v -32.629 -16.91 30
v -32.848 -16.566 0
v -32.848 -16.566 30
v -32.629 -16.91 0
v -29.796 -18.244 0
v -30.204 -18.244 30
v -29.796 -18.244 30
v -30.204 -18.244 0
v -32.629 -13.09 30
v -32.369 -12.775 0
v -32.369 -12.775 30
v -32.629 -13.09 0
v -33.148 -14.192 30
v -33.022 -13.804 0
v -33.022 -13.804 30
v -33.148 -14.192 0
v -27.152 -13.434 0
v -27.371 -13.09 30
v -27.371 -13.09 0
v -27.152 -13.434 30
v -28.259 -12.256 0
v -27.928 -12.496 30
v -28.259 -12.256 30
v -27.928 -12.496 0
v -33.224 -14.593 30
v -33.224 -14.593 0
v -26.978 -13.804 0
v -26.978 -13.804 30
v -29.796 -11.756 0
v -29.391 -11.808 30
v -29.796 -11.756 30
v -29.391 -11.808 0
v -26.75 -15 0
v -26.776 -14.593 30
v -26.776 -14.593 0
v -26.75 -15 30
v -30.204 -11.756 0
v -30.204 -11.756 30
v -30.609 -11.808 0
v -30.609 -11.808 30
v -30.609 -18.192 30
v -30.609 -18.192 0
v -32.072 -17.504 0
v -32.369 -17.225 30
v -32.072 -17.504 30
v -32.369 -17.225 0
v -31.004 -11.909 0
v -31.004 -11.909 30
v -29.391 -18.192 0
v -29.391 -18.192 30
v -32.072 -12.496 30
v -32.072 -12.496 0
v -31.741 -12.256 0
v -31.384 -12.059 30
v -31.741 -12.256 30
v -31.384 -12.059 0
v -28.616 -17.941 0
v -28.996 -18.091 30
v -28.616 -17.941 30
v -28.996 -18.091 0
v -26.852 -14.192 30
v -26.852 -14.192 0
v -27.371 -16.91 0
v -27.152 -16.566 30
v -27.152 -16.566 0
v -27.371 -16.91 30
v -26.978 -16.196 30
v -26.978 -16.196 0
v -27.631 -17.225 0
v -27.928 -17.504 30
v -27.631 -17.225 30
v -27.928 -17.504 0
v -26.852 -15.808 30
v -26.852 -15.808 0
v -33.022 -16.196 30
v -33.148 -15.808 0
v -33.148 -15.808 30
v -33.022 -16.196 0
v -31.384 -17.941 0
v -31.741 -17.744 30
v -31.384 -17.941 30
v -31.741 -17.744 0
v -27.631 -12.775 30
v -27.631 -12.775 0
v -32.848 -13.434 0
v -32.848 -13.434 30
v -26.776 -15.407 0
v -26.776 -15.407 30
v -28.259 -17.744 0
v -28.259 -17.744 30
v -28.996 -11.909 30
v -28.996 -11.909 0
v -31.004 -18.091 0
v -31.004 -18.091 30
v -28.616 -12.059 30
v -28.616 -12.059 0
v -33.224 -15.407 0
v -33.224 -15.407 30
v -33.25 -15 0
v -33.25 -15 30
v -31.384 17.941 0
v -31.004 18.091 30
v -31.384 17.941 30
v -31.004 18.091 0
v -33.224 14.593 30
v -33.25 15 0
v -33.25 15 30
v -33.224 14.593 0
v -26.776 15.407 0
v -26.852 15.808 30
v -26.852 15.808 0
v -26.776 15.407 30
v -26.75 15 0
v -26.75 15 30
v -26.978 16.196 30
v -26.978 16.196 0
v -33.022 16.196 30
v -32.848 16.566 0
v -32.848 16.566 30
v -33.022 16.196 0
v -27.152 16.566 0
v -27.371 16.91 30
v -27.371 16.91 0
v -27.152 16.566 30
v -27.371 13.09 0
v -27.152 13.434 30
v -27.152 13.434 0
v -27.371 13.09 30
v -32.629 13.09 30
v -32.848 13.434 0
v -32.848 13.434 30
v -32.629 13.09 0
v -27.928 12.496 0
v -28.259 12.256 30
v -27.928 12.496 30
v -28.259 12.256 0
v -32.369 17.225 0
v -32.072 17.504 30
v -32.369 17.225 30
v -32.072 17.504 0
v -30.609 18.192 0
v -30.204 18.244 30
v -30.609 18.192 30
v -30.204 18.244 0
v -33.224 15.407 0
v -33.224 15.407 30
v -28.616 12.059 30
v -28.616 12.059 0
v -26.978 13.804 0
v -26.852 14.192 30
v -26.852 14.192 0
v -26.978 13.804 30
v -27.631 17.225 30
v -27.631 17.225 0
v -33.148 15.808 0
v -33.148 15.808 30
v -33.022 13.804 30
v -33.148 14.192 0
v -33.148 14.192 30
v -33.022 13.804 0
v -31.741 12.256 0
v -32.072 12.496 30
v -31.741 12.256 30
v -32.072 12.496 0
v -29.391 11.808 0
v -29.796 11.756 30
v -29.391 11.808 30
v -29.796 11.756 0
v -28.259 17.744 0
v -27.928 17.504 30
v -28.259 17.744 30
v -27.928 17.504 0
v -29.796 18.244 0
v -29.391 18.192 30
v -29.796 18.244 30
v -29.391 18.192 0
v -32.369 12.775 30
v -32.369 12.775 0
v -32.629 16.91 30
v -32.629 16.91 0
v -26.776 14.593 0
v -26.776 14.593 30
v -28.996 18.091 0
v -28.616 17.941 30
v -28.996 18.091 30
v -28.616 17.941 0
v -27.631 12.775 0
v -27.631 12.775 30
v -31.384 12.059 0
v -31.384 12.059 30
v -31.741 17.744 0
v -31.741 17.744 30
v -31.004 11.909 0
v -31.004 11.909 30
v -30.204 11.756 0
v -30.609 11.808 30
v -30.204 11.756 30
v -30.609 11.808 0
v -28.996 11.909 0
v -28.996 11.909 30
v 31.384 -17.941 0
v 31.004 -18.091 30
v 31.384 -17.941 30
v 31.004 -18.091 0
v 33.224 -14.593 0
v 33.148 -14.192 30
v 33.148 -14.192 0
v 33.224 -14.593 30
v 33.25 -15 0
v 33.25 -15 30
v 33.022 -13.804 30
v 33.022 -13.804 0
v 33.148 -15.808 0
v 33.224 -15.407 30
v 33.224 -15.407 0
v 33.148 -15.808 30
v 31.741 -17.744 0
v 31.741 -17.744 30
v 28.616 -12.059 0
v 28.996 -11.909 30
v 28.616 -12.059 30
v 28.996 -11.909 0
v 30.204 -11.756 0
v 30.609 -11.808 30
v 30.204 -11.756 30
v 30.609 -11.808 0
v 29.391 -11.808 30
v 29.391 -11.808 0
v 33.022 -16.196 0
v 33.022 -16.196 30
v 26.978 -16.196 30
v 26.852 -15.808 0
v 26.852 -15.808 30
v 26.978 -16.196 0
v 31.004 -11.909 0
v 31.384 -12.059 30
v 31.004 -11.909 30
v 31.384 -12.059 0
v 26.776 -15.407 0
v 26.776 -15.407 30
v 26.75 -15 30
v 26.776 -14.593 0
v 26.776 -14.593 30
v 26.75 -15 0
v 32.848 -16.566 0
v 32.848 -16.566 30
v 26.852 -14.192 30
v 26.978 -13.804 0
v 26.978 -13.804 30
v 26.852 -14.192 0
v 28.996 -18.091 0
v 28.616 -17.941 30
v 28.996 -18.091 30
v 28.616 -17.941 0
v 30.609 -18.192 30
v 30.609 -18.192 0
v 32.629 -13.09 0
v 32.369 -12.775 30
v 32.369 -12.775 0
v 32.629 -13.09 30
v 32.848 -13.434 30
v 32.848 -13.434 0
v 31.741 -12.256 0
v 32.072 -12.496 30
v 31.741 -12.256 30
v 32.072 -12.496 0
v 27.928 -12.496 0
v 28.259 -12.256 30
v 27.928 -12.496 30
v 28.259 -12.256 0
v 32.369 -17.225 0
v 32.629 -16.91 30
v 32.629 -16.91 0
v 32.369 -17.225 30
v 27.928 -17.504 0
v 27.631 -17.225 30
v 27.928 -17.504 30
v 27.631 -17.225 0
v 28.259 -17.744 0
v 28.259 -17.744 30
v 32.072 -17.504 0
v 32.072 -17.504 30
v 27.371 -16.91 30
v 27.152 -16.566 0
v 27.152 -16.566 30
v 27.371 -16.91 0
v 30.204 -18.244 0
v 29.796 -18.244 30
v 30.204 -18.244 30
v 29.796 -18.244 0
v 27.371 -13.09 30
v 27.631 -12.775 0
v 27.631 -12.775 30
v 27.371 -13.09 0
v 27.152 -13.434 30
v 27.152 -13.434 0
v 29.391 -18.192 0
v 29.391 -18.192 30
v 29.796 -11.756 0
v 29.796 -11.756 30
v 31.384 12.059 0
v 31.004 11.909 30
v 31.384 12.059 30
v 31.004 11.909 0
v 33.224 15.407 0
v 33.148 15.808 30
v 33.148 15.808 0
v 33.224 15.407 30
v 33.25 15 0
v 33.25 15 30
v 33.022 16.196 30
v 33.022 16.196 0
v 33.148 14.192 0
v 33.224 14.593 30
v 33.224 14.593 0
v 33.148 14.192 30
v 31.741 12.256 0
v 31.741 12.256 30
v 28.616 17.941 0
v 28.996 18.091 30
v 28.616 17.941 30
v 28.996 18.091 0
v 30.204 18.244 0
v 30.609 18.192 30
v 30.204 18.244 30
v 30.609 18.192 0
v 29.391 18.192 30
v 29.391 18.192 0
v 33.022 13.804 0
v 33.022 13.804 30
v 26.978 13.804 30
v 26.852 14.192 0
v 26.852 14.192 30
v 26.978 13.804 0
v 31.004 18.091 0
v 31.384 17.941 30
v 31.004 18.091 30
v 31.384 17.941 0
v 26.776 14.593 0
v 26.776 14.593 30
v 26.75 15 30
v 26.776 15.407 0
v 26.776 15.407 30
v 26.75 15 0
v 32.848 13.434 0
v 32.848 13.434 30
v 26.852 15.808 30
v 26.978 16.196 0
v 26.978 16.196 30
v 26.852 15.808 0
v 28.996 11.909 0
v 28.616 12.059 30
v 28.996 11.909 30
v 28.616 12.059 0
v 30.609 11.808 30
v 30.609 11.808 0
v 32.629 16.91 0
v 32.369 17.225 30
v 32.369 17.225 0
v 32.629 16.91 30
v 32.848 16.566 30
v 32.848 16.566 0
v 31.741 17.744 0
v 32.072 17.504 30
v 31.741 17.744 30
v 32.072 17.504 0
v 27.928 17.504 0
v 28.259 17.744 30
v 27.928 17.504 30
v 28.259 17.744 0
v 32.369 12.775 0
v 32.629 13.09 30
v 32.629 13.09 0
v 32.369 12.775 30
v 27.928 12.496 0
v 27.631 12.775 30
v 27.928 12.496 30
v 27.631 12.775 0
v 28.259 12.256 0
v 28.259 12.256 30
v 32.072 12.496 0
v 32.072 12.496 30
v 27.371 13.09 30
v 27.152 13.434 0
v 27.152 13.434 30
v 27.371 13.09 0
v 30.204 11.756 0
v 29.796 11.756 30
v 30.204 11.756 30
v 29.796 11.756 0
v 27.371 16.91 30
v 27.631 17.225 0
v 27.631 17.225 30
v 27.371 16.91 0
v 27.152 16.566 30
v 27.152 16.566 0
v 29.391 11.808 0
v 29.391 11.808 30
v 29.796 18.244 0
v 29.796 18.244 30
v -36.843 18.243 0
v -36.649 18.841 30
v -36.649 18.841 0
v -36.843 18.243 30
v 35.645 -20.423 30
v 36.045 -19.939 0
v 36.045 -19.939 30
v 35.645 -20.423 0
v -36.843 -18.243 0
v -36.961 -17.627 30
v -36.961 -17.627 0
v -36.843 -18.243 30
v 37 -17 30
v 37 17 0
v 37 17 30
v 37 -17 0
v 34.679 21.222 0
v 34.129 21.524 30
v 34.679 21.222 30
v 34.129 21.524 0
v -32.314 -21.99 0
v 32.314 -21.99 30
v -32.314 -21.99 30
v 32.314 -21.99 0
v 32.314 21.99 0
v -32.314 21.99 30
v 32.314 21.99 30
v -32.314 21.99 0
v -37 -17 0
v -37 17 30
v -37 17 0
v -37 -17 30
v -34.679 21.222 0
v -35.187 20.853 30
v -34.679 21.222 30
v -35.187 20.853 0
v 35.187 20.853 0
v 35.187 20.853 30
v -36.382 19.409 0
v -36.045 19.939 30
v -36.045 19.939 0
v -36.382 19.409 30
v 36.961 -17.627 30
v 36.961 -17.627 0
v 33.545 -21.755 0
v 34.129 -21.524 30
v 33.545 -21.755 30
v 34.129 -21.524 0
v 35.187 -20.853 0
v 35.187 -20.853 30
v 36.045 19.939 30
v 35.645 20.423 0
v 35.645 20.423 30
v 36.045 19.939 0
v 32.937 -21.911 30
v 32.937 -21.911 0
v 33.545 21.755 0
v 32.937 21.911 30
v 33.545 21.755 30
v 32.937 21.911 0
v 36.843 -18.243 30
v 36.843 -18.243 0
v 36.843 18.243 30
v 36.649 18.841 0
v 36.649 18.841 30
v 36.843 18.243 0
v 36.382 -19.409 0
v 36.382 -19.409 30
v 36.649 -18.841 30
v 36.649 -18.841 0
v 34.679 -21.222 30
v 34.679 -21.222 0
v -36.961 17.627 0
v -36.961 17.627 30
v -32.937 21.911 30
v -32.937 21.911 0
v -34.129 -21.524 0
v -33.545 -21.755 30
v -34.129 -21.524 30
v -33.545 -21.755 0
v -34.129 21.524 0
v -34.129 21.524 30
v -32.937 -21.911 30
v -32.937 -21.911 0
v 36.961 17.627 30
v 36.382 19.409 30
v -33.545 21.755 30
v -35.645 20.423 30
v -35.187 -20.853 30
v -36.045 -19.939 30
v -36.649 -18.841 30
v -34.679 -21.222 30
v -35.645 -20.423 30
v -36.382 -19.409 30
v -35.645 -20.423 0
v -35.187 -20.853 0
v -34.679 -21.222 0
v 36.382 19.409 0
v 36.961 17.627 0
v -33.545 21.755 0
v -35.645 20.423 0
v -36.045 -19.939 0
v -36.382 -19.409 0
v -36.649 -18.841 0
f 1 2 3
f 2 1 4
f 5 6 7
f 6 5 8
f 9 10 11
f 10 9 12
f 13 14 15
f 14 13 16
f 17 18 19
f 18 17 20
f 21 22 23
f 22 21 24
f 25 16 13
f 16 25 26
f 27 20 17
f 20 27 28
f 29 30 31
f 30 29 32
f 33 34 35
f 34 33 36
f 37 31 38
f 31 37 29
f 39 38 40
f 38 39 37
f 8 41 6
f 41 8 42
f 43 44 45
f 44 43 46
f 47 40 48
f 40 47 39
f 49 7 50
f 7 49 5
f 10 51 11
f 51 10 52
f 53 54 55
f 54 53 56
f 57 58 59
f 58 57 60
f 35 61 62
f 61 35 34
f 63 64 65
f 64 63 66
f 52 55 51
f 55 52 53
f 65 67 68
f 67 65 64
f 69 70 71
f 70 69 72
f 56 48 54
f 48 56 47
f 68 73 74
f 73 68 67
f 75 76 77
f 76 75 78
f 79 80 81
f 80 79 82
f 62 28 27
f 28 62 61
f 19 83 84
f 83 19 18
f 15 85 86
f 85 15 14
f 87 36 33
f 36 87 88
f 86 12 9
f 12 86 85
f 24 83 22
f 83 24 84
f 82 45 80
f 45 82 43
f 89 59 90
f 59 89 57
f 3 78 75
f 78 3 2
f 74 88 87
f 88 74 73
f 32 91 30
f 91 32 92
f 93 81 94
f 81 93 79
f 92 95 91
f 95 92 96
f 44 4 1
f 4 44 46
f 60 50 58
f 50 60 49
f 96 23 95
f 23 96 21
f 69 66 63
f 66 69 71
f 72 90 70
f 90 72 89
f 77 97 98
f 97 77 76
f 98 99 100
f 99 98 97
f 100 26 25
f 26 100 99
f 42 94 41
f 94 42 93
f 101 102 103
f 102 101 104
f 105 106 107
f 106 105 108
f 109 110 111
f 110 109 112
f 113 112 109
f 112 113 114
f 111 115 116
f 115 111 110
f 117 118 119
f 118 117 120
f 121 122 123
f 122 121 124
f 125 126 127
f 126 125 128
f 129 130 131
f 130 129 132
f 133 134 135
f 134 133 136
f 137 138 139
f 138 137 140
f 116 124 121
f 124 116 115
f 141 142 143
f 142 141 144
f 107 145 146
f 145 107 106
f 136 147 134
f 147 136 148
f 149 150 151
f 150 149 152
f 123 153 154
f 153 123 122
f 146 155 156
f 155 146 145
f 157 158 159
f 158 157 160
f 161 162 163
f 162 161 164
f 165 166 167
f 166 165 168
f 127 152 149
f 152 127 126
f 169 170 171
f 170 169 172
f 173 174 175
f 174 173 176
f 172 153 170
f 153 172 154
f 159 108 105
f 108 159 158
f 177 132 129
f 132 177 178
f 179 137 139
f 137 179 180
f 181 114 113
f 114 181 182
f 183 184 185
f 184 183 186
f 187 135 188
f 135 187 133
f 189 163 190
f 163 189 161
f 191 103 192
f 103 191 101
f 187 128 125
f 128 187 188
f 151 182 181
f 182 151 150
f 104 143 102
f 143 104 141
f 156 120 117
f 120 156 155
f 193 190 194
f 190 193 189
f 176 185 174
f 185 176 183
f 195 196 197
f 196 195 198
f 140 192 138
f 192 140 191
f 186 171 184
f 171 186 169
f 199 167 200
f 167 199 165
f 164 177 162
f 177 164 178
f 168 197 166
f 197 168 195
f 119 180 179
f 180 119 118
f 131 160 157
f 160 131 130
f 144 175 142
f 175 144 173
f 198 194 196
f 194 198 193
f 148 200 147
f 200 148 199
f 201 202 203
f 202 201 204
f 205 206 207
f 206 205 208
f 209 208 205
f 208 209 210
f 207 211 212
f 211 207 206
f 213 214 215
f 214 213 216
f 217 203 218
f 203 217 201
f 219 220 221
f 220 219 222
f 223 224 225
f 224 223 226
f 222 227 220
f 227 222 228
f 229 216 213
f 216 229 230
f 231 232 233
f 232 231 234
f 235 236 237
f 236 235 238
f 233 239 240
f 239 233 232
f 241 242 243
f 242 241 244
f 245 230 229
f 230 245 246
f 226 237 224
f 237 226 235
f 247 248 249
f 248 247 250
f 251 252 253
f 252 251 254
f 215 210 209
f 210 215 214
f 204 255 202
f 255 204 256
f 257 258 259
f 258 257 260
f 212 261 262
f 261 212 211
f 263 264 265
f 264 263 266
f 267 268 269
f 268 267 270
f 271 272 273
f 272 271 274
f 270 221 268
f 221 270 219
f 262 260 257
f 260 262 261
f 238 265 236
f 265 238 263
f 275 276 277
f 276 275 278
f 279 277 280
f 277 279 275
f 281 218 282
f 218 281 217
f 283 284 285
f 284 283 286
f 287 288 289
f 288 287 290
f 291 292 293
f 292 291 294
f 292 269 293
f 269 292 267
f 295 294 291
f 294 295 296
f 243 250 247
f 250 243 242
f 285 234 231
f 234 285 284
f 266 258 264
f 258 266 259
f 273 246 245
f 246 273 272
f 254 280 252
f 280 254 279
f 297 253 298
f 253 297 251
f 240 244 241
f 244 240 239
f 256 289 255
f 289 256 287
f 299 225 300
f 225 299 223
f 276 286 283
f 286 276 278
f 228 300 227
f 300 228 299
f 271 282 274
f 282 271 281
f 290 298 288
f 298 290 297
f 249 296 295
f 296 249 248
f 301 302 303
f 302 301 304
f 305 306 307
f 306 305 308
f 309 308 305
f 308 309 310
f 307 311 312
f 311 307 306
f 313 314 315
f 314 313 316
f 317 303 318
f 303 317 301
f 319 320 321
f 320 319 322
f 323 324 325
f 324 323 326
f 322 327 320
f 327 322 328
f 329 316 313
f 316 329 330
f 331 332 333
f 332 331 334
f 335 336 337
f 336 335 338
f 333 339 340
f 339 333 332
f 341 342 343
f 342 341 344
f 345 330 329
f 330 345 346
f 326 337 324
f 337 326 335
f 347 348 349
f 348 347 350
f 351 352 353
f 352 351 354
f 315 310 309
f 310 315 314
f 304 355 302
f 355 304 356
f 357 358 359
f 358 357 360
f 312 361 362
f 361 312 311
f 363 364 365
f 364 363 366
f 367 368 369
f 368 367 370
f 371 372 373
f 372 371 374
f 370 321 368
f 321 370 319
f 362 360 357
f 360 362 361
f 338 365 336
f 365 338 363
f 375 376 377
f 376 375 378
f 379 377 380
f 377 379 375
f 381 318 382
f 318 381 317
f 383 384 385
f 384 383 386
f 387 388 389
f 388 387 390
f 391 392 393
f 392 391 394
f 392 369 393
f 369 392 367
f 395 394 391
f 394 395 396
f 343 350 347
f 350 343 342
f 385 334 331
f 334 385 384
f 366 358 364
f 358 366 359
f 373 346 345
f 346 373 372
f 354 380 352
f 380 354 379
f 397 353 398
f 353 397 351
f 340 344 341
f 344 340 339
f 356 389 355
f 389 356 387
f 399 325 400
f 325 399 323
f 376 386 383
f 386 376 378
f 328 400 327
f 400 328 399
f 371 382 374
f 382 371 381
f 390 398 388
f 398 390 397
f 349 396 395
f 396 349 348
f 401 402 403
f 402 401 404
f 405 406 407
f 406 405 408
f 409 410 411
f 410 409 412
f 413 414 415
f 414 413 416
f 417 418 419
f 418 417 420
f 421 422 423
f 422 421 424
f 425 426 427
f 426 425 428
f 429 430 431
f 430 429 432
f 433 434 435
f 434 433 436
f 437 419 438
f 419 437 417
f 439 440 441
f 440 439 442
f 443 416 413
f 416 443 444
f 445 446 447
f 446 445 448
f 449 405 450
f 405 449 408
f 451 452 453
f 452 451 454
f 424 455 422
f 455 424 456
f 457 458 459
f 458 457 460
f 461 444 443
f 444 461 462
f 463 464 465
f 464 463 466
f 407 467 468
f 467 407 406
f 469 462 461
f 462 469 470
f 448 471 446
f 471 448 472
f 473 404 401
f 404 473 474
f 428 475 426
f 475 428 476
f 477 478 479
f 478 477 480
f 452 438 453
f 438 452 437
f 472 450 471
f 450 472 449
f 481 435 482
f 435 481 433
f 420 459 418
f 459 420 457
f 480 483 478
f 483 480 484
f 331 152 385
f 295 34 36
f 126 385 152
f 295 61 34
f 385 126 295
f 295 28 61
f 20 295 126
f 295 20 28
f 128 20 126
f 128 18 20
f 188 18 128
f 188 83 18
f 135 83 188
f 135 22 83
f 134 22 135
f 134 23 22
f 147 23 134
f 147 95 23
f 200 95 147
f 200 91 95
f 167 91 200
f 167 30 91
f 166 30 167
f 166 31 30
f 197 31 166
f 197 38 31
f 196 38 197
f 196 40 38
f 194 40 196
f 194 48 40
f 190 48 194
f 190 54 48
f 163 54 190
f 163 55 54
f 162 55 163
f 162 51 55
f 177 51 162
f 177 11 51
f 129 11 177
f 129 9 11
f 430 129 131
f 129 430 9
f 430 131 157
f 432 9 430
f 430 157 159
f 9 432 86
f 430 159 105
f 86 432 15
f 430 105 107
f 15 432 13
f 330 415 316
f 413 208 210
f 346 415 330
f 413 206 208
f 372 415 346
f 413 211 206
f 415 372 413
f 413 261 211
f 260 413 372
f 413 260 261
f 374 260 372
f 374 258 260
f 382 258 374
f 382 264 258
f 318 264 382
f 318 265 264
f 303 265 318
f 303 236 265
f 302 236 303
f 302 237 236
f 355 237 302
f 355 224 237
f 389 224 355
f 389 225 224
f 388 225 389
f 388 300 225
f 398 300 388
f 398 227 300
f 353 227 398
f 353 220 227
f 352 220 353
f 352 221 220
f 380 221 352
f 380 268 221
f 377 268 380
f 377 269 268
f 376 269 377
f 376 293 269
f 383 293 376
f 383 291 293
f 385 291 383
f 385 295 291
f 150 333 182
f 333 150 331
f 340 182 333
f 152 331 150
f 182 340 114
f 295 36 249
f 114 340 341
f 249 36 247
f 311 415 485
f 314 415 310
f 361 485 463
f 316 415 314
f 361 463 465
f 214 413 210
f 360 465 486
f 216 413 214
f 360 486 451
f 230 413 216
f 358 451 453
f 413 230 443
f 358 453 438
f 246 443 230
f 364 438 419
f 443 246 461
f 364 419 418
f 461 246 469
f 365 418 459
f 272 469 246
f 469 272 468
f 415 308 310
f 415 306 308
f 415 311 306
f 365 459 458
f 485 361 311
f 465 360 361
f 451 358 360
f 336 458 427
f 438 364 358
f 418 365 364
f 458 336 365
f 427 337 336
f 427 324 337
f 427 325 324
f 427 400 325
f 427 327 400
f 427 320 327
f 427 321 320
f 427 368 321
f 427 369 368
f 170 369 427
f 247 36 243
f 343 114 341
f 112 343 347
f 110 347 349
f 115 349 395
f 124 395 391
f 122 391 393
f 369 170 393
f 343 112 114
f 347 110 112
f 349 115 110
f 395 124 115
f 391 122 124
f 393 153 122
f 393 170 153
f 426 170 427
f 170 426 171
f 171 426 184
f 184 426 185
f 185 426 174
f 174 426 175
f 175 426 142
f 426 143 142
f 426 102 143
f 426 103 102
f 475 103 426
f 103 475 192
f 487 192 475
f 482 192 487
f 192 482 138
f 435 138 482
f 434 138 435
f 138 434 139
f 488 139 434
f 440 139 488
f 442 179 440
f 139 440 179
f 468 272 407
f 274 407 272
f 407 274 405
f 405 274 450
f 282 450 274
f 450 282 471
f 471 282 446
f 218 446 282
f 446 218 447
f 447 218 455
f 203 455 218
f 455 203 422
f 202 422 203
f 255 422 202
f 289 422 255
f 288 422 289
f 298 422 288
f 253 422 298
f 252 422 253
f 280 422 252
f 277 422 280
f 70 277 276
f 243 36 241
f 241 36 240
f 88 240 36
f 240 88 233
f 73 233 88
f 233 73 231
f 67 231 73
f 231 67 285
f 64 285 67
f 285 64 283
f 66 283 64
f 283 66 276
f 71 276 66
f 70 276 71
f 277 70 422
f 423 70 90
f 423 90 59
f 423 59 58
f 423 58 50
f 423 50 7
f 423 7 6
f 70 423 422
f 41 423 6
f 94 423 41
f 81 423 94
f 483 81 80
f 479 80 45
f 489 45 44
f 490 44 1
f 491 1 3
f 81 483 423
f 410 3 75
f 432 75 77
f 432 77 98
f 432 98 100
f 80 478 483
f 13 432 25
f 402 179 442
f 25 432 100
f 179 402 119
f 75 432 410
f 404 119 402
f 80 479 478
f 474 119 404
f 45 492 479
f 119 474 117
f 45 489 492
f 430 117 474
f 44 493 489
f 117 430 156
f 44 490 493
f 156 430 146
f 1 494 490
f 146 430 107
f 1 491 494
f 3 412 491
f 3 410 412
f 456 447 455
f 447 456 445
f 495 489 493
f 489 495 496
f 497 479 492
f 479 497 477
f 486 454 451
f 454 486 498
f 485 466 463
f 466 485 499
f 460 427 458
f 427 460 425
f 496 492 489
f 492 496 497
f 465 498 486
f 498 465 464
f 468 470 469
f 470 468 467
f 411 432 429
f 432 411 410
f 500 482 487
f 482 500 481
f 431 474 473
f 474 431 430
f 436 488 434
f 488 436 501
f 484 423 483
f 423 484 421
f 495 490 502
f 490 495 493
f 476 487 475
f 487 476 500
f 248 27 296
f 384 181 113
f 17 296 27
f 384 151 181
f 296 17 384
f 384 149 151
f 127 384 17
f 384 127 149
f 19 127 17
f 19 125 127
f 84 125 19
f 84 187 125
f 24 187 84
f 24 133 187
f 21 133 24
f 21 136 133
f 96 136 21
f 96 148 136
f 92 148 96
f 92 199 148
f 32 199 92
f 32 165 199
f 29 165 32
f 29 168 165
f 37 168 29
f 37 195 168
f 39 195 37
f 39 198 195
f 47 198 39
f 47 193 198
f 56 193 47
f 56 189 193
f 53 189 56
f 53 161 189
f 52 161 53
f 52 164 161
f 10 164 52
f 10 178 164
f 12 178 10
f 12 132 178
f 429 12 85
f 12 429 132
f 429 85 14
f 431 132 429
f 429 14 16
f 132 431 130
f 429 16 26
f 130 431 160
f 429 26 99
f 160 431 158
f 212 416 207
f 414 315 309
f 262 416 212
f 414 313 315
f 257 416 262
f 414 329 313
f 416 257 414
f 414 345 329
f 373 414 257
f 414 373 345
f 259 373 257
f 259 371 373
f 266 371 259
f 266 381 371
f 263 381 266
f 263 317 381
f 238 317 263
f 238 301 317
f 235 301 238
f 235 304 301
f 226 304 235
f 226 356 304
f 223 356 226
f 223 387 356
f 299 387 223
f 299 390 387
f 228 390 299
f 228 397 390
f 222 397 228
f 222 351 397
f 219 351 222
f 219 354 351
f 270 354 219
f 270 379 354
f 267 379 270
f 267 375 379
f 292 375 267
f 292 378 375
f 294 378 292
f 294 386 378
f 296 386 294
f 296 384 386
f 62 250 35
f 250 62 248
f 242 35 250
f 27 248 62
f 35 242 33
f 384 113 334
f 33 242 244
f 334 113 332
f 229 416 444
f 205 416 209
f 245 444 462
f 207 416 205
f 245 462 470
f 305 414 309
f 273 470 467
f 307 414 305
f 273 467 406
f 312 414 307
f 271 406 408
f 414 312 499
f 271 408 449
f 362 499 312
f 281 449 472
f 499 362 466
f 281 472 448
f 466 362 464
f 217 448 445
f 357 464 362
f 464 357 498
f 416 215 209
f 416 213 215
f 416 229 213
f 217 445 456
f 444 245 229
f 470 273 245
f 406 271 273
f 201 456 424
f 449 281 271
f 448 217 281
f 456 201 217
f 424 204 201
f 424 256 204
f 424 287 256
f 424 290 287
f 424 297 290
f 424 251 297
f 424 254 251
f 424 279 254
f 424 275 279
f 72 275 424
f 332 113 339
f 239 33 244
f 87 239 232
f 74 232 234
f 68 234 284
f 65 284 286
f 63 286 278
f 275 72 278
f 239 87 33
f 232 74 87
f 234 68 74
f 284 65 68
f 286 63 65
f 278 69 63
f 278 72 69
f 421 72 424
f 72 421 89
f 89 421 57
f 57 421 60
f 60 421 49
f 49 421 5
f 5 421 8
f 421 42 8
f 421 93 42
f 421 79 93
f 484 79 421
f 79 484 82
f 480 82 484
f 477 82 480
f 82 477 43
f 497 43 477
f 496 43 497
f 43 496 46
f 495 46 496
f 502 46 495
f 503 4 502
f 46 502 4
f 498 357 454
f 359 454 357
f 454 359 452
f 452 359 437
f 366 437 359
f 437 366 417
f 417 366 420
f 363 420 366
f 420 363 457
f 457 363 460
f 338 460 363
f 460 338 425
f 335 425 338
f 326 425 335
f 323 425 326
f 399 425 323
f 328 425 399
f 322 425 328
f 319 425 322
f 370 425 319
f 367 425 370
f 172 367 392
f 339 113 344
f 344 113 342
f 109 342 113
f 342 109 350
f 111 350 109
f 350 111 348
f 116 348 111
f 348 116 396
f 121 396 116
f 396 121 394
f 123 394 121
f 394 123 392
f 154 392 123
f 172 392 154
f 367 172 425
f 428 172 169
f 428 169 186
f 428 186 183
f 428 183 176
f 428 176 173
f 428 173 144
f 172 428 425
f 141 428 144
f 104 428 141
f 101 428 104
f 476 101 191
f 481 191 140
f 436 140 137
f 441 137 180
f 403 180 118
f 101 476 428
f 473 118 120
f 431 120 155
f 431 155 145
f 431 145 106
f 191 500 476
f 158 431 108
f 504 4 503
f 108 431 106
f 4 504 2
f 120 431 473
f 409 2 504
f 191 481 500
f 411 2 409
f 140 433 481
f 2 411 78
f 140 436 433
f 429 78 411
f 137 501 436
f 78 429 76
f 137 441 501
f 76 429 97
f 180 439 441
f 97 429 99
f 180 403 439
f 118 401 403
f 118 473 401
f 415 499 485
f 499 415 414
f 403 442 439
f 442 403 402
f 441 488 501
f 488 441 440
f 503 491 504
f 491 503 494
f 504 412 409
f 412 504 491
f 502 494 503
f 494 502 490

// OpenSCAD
$fn = 50;


difference() {
	union() {
		hull() {
			translate(v = [-32.0000000000, 17.0000000000, 0]) {
				cylinder(h = 30, r = 5);
			}
			translate(v = [32.0000000000, 17.0000000000, 0]) {
				cylinder(h = 30, r = 5);
			}
			translate(v = [-32.0000000000, -17.0000000000, 0]) {
				cylinder(h = 30, r = 5);
			}
			translate(v = [32.0000000000, -17.0000000000, 0]) {
				cylinder(h = 30, r = 5);
			}
		}
	}
	union() {
		translate(v = [-30.0000000000, -15.0000000000, -100.0000000000]) {
			cylinder(h = 200, r = 3.2500000000);
		}
		translate(v = [-30.0000000000, 15.0000000000, -100.0000000000]) {
			cylinder(h = 200, r = 3.2500000000);
		}
		translate(v = [30.0000000000, -15.0000000000, -100.0000000000]) {
			cylinder(h = 200, r = 3.2500000000);
		}
		translate(v = [30.0000000000, 15.0000000000, -100.0000000000]) {
			cylinder(h = 200, r = 3.2500000000);
		}
	}
}
